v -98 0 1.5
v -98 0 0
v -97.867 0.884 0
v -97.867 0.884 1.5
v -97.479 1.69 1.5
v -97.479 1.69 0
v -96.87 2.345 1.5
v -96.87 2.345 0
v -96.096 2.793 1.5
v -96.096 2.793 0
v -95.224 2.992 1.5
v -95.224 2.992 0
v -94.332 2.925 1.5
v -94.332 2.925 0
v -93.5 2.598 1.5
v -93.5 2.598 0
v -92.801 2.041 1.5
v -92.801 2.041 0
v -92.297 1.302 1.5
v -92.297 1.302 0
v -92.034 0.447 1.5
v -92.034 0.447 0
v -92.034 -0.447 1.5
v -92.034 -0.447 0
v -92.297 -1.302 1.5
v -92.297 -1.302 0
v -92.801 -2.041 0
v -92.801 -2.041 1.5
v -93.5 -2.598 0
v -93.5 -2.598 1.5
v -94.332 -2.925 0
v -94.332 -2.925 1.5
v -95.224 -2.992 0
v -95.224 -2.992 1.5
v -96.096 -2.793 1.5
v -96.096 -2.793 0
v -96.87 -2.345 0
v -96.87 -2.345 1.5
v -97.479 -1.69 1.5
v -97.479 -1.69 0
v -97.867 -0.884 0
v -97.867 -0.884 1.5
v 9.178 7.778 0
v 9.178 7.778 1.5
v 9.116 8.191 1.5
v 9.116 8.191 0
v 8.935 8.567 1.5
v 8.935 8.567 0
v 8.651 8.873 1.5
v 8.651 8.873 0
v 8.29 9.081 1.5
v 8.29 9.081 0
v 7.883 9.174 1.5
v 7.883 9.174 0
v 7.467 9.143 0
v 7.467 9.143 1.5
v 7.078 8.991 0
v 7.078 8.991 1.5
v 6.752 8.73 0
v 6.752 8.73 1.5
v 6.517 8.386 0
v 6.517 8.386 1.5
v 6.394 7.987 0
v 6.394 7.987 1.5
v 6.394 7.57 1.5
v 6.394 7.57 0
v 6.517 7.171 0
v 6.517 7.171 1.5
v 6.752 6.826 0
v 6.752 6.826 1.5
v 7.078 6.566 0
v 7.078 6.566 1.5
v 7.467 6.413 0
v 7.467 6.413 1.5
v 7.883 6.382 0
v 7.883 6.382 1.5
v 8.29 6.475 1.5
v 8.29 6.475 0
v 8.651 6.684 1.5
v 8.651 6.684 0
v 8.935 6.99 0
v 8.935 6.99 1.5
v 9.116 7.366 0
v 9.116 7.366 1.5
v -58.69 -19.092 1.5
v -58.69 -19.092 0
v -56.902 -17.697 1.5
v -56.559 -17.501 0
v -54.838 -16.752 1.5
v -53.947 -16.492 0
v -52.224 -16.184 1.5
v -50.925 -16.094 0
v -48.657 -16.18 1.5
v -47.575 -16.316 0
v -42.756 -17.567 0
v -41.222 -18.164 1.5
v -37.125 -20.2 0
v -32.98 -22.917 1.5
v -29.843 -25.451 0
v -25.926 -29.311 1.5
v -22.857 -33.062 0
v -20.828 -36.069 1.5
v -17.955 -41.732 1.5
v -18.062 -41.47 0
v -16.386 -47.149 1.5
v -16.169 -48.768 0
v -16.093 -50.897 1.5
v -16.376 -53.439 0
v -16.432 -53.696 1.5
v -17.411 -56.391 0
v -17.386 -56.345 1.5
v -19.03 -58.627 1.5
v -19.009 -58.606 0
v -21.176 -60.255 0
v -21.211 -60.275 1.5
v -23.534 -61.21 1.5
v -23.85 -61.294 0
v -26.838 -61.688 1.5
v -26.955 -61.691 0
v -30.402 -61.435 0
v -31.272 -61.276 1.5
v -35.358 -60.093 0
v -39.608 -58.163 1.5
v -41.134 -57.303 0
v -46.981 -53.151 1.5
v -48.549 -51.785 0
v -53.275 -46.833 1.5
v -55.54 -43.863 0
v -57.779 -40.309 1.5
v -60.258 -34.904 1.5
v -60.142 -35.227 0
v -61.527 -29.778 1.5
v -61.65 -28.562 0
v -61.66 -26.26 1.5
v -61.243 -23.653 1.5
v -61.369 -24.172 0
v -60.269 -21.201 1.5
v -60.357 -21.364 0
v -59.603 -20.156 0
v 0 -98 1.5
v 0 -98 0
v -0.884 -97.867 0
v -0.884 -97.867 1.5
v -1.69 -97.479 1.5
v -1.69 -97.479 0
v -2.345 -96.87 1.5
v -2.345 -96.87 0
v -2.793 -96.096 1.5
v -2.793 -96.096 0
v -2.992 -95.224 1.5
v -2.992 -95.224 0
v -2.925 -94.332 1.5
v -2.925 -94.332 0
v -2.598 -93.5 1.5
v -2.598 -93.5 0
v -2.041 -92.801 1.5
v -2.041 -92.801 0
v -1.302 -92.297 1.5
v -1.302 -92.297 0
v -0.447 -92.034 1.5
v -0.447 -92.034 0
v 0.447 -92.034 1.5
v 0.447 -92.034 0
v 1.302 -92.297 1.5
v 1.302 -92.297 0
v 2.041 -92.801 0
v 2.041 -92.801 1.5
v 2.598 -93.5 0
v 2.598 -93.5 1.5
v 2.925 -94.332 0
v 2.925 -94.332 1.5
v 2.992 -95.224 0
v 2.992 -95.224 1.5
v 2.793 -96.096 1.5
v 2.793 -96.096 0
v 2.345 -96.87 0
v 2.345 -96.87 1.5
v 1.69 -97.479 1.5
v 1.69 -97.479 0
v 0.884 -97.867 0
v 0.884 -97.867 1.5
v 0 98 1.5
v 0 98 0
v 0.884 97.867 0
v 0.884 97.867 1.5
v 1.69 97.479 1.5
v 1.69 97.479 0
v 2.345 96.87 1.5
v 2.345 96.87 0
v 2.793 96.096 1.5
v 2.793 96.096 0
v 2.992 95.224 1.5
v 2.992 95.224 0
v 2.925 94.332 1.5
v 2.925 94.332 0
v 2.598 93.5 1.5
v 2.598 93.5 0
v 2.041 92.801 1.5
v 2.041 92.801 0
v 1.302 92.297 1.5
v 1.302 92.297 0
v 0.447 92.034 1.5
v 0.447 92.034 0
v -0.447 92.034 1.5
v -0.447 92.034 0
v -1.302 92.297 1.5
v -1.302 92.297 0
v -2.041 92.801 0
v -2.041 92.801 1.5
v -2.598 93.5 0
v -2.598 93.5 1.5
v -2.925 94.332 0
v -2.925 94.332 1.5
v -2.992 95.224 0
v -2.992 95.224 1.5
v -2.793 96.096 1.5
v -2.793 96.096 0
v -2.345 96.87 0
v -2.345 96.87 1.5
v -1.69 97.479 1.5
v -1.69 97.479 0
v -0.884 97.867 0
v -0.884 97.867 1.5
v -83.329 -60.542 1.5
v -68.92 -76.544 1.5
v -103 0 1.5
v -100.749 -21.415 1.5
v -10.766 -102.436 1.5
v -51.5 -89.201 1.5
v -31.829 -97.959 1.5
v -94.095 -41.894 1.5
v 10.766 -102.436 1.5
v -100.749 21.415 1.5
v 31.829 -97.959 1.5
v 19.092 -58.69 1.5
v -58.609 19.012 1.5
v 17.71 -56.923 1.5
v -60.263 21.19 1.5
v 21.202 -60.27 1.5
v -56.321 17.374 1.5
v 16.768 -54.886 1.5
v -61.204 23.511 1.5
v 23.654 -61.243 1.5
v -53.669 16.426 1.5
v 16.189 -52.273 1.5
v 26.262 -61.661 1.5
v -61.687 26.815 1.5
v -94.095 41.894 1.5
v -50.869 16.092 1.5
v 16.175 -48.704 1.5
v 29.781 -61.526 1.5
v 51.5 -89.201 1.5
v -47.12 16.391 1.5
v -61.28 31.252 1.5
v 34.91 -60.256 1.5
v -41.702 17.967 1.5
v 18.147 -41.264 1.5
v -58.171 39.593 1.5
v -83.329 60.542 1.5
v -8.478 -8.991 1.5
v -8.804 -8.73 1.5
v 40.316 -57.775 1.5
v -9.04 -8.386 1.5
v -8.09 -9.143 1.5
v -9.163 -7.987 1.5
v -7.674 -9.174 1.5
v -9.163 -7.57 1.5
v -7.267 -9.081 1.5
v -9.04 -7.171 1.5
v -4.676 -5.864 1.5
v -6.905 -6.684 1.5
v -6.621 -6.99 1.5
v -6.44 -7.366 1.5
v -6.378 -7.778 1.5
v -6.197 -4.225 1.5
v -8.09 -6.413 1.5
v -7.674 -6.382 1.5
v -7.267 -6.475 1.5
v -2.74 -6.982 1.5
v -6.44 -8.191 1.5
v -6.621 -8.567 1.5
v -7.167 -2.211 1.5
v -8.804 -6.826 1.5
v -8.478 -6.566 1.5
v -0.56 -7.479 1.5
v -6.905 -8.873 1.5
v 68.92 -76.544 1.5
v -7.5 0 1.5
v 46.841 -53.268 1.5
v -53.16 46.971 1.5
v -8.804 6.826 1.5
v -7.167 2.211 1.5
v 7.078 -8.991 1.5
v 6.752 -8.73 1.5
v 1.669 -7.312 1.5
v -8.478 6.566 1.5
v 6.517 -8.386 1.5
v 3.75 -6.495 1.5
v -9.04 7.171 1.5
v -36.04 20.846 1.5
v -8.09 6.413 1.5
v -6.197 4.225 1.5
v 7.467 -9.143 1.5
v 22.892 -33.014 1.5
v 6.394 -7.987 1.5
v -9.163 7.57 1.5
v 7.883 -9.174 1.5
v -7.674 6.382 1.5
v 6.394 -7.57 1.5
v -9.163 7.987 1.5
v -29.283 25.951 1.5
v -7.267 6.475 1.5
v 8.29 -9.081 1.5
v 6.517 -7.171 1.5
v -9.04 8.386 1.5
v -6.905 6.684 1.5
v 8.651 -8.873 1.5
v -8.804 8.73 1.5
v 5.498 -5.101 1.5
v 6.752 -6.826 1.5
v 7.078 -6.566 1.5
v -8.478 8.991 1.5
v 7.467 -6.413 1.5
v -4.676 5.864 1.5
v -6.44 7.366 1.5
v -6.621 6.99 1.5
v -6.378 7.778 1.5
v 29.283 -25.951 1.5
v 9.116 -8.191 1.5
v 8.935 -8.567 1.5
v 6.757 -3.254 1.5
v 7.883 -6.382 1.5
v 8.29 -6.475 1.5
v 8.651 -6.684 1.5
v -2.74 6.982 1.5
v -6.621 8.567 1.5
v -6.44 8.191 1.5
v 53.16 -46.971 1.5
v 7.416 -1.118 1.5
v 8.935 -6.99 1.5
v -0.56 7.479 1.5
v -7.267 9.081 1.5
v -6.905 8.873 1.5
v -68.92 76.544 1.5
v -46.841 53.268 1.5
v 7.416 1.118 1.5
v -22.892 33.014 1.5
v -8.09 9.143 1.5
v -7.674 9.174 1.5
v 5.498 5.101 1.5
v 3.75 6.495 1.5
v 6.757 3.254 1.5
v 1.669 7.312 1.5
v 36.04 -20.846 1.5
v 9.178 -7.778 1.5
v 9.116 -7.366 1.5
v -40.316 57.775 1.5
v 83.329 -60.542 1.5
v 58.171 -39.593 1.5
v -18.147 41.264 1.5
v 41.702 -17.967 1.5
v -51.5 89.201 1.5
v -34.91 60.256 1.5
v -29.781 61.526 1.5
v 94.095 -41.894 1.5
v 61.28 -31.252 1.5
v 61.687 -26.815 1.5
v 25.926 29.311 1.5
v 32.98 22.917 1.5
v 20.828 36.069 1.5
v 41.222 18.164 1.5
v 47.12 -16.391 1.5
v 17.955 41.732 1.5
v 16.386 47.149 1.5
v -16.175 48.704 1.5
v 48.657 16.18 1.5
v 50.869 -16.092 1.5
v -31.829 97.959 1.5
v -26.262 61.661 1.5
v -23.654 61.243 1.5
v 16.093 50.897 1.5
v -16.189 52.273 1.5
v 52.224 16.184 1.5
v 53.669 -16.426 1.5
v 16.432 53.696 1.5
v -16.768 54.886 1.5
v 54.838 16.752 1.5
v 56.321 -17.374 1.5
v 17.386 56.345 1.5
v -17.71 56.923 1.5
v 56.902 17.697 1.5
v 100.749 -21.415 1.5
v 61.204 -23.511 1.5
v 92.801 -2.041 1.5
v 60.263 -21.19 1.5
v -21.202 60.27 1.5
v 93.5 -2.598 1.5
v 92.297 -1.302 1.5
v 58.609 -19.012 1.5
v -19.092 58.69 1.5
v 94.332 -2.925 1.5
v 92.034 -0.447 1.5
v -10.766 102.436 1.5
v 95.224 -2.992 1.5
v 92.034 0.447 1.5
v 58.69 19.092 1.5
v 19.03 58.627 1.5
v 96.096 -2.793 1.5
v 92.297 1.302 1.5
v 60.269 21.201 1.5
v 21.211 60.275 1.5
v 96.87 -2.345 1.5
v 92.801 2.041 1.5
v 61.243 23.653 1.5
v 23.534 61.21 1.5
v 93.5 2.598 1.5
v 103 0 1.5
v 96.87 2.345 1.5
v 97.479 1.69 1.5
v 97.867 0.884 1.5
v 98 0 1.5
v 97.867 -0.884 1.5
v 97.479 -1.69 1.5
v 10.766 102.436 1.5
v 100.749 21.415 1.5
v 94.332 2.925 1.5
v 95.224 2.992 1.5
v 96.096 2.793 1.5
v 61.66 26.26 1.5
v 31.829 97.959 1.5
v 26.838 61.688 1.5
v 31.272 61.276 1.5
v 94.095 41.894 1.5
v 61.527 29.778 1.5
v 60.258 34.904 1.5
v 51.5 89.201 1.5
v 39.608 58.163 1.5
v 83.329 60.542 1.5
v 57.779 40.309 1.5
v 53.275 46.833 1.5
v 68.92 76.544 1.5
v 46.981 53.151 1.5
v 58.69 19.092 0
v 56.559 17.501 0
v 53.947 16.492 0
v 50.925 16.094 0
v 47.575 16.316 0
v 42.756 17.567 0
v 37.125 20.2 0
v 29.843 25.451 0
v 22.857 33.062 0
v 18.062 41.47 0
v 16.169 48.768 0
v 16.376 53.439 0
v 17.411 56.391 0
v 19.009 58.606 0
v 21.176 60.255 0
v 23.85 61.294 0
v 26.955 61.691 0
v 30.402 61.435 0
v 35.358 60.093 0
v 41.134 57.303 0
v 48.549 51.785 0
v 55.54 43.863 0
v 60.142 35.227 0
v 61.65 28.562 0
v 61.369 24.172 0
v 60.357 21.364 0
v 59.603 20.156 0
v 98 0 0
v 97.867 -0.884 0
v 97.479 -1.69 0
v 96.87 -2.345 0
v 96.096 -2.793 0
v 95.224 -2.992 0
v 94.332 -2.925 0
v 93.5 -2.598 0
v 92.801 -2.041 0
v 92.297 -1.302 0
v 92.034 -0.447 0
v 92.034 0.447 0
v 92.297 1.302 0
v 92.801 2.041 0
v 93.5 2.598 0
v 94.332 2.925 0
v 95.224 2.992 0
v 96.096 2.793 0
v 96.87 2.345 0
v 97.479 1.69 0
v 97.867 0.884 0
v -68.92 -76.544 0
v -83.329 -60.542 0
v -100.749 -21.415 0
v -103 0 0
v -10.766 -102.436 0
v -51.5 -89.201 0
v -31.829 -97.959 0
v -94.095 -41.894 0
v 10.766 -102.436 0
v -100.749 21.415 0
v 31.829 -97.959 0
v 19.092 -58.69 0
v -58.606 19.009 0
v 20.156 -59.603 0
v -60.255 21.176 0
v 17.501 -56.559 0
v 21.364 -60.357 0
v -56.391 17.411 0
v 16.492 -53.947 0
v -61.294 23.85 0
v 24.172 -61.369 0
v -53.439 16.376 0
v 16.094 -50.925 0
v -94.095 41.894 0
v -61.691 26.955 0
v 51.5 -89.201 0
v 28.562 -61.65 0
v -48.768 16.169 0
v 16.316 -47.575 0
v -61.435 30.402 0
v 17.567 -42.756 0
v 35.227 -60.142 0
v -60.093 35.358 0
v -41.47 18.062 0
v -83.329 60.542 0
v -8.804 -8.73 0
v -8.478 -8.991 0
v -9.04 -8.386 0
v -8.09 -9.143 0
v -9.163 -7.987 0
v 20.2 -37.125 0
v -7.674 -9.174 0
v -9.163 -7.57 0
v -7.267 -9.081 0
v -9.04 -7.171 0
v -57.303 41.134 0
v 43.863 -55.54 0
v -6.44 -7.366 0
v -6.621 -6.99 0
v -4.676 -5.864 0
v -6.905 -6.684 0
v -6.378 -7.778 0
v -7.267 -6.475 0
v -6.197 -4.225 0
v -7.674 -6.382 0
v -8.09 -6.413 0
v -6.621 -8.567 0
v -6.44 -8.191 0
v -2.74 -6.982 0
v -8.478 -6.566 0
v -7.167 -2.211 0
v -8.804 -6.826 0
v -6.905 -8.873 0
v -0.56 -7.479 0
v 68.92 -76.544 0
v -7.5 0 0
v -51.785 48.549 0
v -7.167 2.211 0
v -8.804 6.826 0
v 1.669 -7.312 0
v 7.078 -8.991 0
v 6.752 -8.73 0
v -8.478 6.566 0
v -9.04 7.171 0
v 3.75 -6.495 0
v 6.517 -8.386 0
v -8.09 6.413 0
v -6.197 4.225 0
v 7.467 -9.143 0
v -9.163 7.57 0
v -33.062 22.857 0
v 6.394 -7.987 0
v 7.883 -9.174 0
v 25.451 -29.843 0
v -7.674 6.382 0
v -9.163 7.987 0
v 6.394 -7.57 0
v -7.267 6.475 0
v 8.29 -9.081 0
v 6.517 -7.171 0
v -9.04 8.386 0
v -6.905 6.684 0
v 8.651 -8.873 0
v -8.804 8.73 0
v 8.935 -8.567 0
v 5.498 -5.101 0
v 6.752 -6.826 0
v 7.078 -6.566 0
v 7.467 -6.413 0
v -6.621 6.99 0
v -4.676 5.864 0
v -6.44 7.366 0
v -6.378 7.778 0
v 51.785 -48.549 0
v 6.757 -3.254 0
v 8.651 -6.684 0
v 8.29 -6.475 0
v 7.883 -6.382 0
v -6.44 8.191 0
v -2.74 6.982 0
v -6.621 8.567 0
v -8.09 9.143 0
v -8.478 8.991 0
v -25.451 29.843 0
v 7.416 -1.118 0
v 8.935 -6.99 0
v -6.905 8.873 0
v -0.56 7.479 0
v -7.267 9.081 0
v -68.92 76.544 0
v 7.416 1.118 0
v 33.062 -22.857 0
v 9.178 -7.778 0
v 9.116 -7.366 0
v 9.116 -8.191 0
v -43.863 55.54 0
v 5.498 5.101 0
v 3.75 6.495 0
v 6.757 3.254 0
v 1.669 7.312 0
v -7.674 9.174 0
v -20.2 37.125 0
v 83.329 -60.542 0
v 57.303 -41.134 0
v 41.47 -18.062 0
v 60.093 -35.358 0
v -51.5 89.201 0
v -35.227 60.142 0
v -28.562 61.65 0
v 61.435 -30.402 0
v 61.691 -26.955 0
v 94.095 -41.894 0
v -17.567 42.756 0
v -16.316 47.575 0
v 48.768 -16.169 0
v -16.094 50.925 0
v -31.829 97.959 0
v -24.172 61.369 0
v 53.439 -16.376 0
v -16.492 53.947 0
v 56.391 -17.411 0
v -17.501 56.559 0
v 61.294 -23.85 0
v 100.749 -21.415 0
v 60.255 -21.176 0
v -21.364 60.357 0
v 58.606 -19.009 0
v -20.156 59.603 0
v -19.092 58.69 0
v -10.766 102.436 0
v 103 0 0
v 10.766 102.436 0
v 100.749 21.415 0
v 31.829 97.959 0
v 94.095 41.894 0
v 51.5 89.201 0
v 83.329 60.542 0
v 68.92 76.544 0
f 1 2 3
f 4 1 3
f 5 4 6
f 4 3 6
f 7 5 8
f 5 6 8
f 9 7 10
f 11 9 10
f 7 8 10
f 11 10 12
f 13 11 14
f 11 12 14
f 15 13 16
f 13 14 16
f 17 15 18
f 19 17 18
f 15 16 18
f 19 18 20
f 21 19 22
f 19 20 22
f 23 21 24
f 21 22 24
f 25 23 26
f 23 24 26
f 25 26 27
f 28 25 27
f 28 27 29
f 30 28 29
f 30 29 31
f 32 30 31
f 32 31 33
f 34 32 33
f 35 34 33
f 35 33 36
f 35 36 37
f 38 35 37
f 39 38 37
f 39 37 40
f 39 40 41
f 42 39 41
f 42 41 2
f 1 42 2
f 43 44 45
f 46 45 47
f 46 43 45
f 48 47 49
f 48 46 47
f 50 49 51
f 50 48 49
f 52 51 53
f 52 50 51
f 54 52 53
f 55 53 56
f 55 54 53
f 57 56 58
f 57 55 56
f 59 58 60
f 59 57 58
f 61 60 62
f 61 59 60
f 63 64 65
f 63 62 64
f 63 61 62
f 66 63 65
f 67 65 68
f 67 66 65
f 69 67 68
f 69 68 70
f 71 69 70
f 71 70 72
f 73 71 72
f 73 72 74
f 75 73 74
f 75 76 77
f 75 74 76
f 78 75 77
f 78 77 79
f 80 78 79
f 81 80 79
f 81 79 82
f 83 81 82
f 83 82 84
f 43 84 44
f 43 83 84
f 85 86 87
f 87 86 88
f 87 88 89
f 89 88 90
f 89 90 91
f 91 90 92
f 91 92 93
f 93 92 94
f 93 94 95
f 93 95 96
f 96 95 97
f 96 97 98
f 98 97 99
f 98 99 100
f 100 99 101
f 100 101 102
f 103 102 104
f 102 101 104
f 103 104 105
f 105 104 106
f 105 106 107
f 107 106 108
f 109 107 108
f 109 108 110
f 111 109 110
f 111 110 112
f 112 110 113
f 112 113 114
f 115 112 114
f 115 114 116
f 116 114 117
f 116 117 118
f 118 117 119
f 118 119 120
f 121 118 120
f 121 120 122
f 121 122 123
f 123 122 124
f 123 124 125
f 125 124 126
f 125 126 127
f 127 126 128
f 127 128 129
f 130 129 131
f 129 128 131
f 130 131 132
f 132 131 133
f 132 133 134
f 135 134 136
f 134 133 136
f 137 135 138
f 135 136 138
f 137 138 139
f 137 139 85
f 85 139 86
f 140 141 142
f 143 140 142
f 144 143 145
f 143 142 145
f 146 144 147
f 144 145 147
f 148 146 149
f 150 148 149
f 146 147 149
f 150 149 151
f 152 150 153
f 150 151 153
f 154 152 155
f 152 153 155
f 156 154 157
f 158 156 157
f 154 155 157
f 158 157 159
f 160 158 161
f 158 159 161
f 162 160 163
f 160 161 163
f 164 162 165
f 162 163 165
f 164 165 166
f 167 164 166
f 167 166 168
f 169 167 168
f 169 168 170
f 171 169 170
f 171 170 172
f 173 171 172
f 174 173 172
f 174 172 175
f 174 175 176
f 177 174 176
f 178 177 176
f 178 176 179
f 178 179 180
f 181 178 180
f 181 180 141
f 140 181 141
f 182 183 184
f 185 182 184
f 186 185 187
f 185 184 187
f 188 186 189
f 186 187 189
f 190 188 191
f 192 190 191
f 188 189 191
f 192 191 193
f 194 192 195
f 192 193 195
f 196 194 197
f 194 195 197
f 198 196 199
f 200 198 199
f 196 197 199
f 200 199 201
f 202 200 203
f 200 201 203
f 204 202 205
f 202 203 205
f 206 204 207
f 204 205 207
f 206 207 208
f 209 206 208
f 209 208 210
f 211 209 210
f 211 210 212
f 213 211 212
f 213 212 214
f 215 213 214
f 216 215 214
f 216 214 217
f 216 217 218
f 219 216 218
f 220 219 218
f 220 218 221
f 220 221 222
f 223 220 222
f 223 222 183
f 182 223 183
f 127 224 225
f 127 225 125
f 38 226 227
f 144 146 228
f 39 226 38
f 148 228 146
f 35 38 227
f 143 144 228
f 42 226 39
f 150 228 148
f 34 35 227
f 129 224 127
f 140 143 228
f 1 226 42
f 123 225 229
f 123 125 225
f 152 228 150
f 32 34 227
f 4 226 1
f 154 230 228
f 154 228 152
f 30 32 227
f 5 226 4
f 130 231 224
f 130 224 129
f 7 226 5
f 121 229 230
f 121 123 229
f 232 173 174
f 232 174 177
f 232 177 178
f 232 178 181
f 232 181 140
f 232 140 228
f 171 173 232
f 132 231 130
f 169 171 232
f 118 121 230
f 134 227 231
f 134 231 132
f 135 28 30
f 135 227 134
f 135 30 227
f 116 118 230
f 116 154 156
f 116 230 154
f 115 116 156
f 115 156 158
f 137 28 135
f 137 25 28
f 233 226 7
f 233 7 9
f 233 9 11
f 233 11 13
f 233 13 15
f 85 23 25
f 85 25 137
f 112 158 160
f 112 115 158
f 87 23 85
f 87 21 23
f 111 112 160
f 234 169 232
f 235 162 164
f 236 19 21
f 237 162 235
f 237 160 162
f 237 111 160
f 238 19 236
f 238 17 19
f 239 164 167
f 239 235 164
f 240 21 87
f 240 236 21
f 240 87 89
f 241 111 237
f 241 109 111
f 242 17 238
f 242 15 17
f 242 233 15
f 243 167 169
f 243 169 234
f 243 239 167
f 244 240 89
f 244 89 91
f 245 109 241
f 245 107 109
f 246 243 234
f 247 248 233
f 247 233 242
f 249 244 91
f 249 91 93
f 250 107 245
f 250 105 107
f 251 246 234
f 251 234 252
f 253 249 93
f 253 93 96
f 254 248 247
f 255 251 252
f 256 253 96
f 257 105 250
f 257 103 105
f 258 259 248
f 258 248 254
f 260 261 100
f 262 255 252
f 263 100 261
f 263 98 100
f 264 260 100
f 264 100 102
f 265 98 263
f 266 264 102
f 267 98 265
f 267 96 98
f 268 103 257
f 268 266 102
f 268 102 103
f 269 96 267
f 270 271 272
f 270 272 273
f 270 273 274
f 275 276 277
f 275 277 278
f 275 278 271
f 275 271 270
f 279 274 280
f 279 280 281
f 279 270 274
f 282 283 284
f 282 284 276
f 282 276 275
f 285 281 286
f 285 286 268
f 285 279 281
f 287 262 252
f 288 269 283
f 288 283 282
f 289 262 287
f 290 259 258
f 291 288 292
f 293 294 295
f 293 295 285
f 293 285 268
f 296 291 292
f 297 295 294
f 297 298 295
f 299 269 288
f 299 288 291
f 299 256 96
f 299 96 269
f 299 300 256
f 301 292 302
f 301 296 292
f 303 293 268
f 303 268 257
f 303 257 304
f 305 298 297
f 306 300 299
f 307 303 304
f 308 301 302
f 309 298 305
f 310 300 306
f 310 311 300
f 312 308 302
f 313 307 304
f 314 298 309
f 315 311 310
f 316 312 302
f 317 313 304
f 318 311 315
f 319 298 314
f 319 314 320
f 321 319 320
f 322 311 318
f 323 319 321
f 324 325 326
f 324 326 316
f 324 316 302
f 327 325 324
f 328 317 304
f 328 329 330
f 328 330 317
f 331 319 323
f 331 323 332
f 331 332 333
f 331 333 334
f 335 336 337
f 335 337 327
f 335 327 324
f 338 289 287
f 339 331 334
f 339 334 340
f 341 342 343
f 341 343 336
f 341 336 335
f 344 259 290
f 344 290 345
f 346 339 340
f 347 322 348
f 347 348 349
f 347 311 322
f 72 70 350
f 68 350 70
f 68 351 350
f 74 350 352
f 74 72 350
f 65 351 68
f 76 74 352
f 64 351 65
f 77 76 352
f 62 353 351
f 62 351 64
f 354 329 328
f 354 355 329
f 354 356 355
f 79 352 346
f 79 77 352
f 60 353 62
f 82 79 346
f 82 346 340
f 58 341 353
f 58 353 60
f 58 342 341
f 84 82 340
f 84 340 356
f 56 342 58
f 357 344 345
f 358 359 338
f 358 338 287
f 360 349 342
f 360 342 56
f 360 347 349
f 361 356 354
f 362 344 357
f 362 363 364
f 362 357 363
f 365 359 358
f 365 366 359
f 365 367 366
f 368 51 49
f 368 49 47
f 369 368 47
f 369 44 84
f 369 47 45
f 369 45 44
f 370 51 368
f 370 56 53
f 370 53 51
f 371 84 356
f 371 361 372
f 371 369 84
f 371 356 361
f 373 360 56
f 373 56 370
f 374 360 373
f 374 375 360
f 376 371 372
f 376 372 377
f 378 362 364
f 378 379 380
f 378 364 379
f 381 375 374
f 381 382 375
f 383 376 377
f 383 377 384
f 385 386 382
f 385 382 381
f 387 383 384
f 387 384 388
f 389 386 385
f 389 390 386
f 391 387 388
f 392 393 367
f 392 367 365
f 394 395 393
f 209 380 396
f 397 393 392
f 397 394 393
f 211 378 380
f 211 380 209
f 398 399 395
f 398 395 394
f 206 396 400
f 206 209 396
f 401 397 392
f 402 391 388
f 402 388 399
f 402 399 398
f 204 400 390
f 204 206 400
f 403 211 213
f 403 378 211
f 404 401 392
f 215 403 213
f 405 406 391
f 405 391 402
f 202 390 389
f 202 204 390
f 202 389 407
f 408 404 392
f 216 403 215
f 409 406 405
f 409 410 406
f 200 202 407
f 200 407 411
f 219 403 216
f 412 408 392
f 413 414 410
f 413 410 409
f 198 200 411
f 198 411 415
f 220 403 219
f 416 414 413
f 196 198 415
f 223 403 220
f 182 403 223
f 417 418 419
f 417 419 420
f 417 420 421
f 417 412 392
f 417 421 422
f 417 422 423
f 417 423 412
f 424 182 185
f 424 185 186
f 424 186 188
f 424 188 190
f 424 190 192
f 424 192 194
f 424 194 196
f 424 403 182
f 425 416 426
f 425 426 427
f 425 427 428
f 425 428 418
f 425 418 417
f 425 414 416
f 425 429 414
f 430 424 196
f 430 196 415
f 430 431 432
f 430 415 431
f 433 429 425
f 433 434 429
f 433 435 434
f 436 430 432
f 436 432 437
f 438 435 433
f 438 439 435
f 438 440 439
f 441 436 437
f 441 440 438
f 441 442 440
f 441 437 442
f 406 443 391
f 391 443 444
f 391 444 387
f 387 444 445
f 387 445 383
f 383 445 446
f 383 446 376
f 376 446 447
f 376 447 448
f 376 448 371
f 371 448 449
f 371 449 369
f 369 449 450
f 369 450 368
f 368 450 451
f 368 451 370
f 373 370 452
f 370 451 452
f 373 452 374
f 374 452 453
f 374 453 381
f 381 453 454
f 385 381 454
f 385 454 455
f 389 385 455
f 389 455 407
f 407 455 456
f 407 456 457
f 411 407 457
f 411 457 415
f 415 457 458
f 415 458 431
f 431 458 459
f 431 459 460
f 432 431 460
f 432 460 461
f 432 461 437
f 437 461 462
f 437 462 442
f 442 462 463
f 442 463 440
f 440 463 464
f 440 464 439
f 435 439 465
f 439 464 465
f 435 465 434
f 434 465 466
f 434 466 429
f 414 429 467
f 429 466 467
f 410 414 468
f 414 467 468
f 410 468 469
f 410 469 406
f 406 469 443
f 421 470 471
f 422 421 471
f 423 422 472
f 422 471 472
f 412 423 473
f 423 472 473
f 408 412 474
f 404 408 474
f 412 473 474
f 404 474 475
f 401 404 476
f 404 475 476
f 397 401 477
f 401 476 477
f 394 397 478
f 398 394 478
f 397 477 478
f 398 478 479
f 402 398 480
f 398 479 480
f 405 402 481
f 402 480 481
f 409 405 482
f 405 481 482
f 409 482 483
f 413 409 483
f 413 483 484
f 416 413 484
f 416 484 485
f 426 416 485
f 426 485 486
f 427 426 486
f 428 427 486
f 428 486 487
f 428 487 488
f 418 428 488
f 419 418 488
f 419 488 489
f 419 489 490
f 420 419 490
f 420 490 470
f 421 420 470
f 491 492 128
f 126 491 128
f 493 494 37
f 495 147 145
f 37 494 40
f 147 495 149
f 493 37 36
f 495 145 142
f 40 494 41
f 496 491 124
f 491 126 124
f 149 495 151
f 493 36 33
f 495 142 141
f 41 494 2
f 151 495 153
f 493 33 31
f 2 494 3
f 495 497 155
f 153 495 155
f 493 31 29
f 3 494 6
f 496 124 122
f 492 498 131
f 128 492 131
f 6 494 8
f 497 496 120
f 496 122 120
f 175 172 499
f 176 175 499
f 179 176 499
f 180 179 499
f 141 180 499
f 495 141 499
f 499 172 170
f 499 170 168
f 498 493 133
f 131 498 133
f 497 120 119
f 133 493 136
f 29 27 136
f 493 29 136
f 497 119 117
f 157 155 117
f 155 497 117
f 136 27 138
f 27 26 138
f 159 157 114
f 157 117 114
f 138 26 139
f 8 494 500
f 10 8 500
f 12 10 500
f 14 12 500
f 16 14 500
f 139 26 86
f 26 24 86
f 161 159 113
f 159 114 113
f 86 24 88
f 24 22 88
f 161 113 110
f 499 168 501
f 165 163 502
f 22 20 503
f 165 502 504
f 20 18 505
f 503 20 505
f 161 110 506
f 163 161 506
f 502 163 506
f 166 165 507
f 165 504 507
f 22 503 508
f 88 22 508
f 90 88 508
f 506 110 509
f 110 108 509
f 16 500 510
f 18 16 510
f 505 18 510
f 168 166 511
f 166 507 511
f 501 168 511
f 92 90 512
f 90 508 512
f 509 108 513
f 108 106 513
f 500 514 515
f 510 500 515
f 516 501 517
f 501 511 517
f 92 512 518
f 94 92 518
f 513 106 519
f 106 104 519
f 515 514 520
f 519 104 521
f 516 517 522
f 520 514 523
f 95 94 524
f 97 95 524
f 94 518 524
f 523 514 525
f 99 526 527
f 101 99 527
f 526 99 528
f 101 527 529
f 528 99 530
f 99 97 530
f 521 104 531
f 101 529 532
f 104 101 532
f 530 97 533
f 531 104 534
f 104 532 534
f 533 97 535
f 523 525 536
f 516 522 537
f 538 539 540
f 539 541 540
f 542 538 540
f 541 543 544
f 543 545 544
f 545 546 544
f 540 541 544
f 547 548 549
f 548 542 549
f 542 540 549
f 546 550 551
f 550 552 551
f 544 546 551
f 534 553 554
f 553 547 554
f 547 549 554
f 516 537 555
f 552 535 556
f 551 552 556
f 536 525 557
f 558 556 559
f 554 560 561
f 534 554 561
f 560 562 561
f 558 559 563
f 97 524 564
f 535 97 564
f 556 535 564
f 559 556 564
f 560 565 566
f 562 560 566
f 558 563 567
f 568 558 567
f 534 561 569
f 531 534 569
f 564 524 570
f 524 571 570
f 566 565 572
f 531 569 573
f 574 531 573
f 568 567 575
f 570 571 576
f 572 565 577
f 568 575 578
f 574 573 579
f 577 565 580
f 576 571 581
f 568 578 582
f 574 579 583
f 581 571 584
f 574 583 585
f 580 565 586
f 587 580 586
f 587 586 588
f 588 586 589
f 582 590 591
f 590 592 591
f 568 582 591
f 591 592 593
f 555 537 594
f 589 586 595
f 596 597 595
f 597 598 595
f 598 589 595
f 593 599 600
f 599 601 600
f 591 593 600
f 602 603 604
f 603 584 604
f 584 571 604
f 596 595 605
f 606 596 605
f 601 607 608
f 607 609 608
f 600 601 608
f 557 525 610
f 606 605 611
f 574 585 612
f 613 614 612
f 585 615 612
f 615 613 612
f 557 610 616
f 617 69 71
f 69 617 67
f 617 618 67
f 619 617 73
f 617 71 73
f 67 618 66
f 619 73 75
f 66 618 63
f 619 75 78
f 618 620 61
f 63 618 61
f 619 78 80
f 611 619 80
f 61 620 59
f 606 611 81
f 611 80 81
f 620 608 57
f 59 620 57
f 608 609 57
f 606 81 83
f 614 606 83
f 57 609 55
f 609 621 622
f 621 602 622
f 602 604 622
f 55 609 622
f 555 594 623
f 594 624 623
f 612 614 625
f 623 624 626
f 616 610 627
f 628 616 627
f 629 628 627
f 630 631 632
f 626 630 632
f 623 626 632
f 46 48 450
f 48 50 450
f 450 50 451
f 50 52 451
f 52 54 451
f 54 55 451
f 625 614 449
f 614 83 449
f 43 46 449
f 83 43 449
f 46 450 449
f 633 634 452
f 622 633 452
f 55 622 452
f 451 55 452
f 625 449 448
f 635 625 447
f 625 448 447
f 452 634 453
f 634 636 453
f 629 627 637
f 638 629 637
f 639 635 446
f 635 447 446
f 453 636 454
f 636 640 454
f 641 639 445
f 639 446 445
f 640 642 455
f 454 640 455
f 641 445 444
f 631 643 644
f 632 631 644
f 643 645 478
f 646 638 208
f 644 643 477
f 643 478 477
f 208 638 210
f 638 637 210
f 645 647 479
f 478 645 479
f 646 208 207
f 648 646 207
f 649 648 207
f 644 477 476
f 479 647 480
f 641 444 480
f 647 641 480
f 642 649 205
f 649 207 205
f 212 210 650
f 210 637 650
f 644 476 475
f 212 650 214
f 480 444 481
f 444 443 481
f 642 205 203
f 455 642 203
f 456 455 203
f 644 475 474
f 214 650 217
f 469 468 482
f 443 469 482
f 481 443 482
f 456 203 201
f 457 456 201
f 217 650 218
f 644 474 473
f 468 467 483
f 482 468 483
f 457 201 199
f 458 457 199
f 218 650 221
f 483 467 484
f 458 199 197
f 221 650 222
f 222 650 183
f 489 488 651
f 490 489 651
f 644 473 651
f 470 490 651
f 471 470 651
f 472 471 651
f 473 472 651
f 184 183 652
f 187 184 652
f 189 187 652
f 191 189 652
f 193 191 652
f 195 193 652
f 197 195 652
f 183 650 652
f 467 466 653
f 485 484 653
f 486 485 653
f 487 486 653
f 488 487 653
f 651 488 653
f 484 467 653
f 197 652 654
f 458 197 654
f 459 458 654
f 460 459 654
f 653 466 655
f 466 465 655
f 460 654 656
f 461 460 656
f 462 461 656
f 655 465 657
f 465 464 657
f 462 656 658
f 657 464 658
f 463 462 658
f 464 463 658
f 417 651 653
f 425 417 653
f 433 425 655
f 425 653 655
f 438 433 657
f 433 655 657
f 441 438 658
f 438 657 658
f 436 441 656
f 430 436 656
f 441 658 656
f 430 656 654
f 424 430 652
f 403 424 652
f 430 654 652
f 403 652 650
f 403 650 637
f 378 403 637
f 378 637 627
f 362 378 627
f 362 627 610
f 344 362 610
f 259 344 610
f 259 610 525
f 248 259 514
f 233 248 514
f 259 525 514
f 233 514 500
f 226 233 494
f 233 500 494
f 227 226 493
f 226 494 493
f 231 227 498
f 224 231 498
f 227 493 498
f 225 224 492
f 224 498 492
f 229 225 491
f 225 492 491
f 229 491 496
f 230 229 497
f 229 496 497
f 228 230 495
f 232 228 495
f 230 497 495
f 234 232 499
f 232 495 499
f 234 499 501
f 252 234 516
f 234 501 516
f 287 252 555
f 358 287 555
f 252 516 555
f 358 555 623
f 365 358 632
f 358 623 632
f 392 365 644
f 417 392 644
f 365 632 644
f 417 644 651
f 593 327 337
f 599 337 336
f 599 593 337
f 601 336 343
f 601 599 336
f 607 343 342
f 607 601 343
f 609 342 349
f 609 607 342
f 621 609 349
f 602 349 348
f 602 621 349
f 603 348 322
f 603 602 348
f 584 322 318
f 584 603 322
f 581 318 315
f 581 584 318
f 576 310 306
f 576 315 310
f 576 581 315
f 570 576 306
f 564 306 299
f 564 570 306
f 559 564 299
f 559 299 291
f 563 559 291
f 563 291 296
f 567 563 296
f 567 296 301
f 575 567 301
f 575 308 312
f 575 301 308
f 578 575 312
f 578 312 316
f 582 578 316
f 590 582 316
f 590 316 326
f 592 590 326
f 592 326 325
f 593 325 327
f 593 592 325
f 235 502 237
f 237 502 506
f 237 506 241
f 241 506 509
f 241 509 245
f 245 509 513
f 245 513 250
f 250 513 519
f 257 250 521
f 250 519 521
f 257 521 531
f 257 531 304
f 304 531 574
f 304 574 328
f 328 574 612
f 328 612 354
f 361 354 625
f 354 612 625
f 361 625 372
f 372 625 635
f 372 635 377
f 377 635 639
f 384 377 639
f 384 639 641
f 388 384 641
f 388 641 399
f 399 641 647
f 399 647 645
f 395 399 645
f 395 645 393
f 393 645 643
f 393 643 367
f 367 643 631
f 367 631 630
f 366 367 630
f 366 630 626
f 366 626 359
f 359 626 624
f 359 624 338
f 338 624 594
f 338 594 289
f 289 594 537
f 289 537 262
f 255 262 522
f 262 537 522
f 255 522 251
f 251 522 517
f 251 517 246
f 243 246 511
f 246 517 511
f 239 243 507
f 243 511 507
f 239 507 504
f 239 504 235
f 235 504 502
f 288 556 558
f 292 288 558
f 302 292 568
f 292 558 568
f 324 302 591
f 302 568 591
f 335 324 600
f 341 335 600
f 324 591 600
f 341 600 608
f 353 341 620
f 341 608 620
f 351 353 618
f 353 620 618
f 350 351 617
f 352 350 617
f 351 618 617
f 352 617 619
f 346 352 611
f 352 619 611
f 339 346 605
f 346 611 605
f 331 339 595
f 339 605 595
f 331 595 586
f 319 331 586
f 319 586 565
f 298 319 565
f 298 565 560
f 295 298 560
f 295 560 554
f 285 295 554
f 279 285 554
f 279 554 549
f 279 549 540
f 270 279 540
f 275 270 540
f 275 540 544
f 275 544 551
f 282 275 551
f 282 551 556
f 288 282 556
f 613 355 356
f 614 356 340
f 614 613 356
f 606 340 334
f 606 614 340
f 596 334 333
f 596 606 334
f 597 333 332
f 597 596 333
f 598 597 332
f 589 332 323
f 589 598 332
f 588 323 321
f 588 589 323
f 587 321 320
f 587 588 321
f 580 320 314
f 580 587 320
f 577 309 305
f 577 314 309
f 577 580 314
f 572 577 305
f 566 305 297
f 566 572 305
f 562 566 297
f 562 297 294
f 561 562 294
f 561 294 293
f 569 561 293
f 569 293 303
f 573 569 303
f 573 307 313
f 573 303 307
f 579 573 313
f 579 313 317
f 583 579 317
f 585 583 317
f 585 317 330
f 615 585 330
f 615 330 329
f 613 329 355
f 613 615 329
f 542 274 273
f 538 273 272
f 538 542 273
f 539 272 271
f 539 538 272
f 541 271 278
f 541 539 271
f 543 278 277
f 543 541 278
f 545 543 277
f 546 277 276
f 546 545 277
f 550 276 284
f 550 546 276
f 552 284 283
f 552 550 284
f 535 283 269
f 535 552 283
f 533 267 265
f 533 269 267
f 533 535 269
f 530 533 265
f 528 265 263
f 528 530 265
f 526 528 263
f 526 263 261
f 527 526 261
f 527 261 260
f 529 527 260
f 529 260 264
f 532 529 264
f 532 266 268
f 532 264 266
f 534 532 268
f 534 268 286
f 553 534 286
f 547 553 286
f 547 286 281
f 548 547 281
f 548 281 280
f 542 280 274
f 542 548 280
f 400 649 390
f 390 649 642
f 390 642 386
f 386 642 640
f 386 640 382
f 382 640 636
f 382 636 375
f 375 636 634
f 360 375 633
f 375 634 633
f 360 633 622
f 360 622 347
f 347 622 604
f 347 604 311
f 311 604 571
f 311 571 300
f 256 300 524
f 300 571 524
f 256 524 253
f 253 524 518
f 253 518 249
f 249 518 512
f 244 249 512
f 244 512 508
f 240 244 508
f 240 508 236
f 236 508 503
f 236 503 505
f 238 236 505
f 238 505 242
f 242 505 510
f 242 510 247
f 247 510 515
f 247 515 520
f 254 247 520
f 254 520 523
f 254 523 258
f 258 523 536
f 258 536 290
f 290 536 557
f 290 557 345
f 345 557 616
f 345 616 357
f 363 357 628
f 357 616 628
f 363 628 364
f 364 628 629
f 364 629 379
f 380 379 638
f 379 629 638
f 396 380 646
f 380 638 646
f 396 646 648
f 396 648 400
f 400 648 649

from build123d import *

# Parameters (mm, degrees)
SKETCH1_R          = 103
BASE_DISC_DEPTH    = 1.5
SKETCH3_R          = 3
CUT_EXTRUDE1_DEPTH = 146.671719973
SKETCH4_RX         = 28
SKETCH4_RY         = 16
CUT_EXTRUDE2_DEPTH = 146.671719973
SKETCH2_R          = 7.5
CUT_EXTRUDE3_DEPTH = 146.671720116
CIRPATTERN3_COUNT  = 4
CIRPATTERN4_COUNT  = 4
SKETCH5_R          = 1.4
CUT_EXTRUDE4_DEPTH = 146.671720116


with BuildPart() as part:
    # Sketch1 → Base Disc (new body)
    with BuildSketch(Plane.XY):
        Circle(SKETCH1_R)
    extrude(amount=BASE_DISC_DEPTH)

    # Sketch3 → Cut-Extrude1 (cut, through all)
    with BuildSketch(Plane(origin=(0, 0, 0), x_dir=(-1, 0, 0), z_dir=(0, 0, -1))):
        with Locations((95, 0)):
            Circle(SKETCH3_R)
    cut_extrude1 = extrude(amount=-CUT_EXTRUDE1_DEPTH, mode=Mode.SUBTRACT)

    # Sketch4 → Cut-Extrude2 (cut, through all)
    with BuildSketch(Plane(origin=(0, 0, 0), x_dir=(-1, 0, 0), z_dir=(0, 0, -1))):
        with Locations(Location((38.890872965, 38.890872965), (0, 0, 135))):
            Ellipse(SKETCH4_RX, SKETCH4_RY)
    cut_extrude2 = extrude(amount=-CUT_EXTRUDE2_DEPTH, mode=Mode.SUBTRACT)

    # Sketch2 → Cut-Extrude3 (cut, through all)
    with BuildSketch(Plane(origin=(0, 0, 0), x_dir=(-1, 0, 0), z_dir=(0, 0, -1))):
        Circle(SKETCH2_R)
    extrude(amount=-CUT_EXTRUDE3_DEPTH, mode=Mode.SUBTRACT)

    # CirPattern3: Cut-Extrude1 ×4 about axis
    cirpattern3_axis = Axis((0, 0, 0), (0, 0, 1))
    for i in range(1, CIRPATTERN3_COUNT):
        add(cut_extrude1.rotate(cirpattern3_axis, i * 360 / CIRPATTERN3_COUNT), mode=Mode.SUBTRACT)

    # CirPattern4: Cut-Extrude2 ×4 about axis
    cirpattern4_axis = Axis((0, 0, 0), (0, 0, -1))
    for i in range(1, CIRPATTERN4_COUNT):
        add(cut_extrude2.rotate(cirpattern4_axis, i * 360 / CIRPATTERN4_COUNT), mode=Mode.SUBTRACT)

    # Sketch5 → Cut-Extrude4 (cut, through all)
    with BuildSketch(Plane.XY):
        with Locations((-7.778174593, -7.778174593)):
            Circle(SKETCH5_R)
        with Locations((-7.778174593, 7.778174593)):
            Circle(SKETCH5_R)
        with Locations((7.778174593, 7.778174593)):
            Circle(SKETCH5_R)
        with Locations((7.778174593, -7.778174593)):
            Circle(SKETCH5_R)
    extrude(amount=CUT_EXTRUDE4_DEPTH, mode=Mode.SUBTRACT)


solid = part.part
